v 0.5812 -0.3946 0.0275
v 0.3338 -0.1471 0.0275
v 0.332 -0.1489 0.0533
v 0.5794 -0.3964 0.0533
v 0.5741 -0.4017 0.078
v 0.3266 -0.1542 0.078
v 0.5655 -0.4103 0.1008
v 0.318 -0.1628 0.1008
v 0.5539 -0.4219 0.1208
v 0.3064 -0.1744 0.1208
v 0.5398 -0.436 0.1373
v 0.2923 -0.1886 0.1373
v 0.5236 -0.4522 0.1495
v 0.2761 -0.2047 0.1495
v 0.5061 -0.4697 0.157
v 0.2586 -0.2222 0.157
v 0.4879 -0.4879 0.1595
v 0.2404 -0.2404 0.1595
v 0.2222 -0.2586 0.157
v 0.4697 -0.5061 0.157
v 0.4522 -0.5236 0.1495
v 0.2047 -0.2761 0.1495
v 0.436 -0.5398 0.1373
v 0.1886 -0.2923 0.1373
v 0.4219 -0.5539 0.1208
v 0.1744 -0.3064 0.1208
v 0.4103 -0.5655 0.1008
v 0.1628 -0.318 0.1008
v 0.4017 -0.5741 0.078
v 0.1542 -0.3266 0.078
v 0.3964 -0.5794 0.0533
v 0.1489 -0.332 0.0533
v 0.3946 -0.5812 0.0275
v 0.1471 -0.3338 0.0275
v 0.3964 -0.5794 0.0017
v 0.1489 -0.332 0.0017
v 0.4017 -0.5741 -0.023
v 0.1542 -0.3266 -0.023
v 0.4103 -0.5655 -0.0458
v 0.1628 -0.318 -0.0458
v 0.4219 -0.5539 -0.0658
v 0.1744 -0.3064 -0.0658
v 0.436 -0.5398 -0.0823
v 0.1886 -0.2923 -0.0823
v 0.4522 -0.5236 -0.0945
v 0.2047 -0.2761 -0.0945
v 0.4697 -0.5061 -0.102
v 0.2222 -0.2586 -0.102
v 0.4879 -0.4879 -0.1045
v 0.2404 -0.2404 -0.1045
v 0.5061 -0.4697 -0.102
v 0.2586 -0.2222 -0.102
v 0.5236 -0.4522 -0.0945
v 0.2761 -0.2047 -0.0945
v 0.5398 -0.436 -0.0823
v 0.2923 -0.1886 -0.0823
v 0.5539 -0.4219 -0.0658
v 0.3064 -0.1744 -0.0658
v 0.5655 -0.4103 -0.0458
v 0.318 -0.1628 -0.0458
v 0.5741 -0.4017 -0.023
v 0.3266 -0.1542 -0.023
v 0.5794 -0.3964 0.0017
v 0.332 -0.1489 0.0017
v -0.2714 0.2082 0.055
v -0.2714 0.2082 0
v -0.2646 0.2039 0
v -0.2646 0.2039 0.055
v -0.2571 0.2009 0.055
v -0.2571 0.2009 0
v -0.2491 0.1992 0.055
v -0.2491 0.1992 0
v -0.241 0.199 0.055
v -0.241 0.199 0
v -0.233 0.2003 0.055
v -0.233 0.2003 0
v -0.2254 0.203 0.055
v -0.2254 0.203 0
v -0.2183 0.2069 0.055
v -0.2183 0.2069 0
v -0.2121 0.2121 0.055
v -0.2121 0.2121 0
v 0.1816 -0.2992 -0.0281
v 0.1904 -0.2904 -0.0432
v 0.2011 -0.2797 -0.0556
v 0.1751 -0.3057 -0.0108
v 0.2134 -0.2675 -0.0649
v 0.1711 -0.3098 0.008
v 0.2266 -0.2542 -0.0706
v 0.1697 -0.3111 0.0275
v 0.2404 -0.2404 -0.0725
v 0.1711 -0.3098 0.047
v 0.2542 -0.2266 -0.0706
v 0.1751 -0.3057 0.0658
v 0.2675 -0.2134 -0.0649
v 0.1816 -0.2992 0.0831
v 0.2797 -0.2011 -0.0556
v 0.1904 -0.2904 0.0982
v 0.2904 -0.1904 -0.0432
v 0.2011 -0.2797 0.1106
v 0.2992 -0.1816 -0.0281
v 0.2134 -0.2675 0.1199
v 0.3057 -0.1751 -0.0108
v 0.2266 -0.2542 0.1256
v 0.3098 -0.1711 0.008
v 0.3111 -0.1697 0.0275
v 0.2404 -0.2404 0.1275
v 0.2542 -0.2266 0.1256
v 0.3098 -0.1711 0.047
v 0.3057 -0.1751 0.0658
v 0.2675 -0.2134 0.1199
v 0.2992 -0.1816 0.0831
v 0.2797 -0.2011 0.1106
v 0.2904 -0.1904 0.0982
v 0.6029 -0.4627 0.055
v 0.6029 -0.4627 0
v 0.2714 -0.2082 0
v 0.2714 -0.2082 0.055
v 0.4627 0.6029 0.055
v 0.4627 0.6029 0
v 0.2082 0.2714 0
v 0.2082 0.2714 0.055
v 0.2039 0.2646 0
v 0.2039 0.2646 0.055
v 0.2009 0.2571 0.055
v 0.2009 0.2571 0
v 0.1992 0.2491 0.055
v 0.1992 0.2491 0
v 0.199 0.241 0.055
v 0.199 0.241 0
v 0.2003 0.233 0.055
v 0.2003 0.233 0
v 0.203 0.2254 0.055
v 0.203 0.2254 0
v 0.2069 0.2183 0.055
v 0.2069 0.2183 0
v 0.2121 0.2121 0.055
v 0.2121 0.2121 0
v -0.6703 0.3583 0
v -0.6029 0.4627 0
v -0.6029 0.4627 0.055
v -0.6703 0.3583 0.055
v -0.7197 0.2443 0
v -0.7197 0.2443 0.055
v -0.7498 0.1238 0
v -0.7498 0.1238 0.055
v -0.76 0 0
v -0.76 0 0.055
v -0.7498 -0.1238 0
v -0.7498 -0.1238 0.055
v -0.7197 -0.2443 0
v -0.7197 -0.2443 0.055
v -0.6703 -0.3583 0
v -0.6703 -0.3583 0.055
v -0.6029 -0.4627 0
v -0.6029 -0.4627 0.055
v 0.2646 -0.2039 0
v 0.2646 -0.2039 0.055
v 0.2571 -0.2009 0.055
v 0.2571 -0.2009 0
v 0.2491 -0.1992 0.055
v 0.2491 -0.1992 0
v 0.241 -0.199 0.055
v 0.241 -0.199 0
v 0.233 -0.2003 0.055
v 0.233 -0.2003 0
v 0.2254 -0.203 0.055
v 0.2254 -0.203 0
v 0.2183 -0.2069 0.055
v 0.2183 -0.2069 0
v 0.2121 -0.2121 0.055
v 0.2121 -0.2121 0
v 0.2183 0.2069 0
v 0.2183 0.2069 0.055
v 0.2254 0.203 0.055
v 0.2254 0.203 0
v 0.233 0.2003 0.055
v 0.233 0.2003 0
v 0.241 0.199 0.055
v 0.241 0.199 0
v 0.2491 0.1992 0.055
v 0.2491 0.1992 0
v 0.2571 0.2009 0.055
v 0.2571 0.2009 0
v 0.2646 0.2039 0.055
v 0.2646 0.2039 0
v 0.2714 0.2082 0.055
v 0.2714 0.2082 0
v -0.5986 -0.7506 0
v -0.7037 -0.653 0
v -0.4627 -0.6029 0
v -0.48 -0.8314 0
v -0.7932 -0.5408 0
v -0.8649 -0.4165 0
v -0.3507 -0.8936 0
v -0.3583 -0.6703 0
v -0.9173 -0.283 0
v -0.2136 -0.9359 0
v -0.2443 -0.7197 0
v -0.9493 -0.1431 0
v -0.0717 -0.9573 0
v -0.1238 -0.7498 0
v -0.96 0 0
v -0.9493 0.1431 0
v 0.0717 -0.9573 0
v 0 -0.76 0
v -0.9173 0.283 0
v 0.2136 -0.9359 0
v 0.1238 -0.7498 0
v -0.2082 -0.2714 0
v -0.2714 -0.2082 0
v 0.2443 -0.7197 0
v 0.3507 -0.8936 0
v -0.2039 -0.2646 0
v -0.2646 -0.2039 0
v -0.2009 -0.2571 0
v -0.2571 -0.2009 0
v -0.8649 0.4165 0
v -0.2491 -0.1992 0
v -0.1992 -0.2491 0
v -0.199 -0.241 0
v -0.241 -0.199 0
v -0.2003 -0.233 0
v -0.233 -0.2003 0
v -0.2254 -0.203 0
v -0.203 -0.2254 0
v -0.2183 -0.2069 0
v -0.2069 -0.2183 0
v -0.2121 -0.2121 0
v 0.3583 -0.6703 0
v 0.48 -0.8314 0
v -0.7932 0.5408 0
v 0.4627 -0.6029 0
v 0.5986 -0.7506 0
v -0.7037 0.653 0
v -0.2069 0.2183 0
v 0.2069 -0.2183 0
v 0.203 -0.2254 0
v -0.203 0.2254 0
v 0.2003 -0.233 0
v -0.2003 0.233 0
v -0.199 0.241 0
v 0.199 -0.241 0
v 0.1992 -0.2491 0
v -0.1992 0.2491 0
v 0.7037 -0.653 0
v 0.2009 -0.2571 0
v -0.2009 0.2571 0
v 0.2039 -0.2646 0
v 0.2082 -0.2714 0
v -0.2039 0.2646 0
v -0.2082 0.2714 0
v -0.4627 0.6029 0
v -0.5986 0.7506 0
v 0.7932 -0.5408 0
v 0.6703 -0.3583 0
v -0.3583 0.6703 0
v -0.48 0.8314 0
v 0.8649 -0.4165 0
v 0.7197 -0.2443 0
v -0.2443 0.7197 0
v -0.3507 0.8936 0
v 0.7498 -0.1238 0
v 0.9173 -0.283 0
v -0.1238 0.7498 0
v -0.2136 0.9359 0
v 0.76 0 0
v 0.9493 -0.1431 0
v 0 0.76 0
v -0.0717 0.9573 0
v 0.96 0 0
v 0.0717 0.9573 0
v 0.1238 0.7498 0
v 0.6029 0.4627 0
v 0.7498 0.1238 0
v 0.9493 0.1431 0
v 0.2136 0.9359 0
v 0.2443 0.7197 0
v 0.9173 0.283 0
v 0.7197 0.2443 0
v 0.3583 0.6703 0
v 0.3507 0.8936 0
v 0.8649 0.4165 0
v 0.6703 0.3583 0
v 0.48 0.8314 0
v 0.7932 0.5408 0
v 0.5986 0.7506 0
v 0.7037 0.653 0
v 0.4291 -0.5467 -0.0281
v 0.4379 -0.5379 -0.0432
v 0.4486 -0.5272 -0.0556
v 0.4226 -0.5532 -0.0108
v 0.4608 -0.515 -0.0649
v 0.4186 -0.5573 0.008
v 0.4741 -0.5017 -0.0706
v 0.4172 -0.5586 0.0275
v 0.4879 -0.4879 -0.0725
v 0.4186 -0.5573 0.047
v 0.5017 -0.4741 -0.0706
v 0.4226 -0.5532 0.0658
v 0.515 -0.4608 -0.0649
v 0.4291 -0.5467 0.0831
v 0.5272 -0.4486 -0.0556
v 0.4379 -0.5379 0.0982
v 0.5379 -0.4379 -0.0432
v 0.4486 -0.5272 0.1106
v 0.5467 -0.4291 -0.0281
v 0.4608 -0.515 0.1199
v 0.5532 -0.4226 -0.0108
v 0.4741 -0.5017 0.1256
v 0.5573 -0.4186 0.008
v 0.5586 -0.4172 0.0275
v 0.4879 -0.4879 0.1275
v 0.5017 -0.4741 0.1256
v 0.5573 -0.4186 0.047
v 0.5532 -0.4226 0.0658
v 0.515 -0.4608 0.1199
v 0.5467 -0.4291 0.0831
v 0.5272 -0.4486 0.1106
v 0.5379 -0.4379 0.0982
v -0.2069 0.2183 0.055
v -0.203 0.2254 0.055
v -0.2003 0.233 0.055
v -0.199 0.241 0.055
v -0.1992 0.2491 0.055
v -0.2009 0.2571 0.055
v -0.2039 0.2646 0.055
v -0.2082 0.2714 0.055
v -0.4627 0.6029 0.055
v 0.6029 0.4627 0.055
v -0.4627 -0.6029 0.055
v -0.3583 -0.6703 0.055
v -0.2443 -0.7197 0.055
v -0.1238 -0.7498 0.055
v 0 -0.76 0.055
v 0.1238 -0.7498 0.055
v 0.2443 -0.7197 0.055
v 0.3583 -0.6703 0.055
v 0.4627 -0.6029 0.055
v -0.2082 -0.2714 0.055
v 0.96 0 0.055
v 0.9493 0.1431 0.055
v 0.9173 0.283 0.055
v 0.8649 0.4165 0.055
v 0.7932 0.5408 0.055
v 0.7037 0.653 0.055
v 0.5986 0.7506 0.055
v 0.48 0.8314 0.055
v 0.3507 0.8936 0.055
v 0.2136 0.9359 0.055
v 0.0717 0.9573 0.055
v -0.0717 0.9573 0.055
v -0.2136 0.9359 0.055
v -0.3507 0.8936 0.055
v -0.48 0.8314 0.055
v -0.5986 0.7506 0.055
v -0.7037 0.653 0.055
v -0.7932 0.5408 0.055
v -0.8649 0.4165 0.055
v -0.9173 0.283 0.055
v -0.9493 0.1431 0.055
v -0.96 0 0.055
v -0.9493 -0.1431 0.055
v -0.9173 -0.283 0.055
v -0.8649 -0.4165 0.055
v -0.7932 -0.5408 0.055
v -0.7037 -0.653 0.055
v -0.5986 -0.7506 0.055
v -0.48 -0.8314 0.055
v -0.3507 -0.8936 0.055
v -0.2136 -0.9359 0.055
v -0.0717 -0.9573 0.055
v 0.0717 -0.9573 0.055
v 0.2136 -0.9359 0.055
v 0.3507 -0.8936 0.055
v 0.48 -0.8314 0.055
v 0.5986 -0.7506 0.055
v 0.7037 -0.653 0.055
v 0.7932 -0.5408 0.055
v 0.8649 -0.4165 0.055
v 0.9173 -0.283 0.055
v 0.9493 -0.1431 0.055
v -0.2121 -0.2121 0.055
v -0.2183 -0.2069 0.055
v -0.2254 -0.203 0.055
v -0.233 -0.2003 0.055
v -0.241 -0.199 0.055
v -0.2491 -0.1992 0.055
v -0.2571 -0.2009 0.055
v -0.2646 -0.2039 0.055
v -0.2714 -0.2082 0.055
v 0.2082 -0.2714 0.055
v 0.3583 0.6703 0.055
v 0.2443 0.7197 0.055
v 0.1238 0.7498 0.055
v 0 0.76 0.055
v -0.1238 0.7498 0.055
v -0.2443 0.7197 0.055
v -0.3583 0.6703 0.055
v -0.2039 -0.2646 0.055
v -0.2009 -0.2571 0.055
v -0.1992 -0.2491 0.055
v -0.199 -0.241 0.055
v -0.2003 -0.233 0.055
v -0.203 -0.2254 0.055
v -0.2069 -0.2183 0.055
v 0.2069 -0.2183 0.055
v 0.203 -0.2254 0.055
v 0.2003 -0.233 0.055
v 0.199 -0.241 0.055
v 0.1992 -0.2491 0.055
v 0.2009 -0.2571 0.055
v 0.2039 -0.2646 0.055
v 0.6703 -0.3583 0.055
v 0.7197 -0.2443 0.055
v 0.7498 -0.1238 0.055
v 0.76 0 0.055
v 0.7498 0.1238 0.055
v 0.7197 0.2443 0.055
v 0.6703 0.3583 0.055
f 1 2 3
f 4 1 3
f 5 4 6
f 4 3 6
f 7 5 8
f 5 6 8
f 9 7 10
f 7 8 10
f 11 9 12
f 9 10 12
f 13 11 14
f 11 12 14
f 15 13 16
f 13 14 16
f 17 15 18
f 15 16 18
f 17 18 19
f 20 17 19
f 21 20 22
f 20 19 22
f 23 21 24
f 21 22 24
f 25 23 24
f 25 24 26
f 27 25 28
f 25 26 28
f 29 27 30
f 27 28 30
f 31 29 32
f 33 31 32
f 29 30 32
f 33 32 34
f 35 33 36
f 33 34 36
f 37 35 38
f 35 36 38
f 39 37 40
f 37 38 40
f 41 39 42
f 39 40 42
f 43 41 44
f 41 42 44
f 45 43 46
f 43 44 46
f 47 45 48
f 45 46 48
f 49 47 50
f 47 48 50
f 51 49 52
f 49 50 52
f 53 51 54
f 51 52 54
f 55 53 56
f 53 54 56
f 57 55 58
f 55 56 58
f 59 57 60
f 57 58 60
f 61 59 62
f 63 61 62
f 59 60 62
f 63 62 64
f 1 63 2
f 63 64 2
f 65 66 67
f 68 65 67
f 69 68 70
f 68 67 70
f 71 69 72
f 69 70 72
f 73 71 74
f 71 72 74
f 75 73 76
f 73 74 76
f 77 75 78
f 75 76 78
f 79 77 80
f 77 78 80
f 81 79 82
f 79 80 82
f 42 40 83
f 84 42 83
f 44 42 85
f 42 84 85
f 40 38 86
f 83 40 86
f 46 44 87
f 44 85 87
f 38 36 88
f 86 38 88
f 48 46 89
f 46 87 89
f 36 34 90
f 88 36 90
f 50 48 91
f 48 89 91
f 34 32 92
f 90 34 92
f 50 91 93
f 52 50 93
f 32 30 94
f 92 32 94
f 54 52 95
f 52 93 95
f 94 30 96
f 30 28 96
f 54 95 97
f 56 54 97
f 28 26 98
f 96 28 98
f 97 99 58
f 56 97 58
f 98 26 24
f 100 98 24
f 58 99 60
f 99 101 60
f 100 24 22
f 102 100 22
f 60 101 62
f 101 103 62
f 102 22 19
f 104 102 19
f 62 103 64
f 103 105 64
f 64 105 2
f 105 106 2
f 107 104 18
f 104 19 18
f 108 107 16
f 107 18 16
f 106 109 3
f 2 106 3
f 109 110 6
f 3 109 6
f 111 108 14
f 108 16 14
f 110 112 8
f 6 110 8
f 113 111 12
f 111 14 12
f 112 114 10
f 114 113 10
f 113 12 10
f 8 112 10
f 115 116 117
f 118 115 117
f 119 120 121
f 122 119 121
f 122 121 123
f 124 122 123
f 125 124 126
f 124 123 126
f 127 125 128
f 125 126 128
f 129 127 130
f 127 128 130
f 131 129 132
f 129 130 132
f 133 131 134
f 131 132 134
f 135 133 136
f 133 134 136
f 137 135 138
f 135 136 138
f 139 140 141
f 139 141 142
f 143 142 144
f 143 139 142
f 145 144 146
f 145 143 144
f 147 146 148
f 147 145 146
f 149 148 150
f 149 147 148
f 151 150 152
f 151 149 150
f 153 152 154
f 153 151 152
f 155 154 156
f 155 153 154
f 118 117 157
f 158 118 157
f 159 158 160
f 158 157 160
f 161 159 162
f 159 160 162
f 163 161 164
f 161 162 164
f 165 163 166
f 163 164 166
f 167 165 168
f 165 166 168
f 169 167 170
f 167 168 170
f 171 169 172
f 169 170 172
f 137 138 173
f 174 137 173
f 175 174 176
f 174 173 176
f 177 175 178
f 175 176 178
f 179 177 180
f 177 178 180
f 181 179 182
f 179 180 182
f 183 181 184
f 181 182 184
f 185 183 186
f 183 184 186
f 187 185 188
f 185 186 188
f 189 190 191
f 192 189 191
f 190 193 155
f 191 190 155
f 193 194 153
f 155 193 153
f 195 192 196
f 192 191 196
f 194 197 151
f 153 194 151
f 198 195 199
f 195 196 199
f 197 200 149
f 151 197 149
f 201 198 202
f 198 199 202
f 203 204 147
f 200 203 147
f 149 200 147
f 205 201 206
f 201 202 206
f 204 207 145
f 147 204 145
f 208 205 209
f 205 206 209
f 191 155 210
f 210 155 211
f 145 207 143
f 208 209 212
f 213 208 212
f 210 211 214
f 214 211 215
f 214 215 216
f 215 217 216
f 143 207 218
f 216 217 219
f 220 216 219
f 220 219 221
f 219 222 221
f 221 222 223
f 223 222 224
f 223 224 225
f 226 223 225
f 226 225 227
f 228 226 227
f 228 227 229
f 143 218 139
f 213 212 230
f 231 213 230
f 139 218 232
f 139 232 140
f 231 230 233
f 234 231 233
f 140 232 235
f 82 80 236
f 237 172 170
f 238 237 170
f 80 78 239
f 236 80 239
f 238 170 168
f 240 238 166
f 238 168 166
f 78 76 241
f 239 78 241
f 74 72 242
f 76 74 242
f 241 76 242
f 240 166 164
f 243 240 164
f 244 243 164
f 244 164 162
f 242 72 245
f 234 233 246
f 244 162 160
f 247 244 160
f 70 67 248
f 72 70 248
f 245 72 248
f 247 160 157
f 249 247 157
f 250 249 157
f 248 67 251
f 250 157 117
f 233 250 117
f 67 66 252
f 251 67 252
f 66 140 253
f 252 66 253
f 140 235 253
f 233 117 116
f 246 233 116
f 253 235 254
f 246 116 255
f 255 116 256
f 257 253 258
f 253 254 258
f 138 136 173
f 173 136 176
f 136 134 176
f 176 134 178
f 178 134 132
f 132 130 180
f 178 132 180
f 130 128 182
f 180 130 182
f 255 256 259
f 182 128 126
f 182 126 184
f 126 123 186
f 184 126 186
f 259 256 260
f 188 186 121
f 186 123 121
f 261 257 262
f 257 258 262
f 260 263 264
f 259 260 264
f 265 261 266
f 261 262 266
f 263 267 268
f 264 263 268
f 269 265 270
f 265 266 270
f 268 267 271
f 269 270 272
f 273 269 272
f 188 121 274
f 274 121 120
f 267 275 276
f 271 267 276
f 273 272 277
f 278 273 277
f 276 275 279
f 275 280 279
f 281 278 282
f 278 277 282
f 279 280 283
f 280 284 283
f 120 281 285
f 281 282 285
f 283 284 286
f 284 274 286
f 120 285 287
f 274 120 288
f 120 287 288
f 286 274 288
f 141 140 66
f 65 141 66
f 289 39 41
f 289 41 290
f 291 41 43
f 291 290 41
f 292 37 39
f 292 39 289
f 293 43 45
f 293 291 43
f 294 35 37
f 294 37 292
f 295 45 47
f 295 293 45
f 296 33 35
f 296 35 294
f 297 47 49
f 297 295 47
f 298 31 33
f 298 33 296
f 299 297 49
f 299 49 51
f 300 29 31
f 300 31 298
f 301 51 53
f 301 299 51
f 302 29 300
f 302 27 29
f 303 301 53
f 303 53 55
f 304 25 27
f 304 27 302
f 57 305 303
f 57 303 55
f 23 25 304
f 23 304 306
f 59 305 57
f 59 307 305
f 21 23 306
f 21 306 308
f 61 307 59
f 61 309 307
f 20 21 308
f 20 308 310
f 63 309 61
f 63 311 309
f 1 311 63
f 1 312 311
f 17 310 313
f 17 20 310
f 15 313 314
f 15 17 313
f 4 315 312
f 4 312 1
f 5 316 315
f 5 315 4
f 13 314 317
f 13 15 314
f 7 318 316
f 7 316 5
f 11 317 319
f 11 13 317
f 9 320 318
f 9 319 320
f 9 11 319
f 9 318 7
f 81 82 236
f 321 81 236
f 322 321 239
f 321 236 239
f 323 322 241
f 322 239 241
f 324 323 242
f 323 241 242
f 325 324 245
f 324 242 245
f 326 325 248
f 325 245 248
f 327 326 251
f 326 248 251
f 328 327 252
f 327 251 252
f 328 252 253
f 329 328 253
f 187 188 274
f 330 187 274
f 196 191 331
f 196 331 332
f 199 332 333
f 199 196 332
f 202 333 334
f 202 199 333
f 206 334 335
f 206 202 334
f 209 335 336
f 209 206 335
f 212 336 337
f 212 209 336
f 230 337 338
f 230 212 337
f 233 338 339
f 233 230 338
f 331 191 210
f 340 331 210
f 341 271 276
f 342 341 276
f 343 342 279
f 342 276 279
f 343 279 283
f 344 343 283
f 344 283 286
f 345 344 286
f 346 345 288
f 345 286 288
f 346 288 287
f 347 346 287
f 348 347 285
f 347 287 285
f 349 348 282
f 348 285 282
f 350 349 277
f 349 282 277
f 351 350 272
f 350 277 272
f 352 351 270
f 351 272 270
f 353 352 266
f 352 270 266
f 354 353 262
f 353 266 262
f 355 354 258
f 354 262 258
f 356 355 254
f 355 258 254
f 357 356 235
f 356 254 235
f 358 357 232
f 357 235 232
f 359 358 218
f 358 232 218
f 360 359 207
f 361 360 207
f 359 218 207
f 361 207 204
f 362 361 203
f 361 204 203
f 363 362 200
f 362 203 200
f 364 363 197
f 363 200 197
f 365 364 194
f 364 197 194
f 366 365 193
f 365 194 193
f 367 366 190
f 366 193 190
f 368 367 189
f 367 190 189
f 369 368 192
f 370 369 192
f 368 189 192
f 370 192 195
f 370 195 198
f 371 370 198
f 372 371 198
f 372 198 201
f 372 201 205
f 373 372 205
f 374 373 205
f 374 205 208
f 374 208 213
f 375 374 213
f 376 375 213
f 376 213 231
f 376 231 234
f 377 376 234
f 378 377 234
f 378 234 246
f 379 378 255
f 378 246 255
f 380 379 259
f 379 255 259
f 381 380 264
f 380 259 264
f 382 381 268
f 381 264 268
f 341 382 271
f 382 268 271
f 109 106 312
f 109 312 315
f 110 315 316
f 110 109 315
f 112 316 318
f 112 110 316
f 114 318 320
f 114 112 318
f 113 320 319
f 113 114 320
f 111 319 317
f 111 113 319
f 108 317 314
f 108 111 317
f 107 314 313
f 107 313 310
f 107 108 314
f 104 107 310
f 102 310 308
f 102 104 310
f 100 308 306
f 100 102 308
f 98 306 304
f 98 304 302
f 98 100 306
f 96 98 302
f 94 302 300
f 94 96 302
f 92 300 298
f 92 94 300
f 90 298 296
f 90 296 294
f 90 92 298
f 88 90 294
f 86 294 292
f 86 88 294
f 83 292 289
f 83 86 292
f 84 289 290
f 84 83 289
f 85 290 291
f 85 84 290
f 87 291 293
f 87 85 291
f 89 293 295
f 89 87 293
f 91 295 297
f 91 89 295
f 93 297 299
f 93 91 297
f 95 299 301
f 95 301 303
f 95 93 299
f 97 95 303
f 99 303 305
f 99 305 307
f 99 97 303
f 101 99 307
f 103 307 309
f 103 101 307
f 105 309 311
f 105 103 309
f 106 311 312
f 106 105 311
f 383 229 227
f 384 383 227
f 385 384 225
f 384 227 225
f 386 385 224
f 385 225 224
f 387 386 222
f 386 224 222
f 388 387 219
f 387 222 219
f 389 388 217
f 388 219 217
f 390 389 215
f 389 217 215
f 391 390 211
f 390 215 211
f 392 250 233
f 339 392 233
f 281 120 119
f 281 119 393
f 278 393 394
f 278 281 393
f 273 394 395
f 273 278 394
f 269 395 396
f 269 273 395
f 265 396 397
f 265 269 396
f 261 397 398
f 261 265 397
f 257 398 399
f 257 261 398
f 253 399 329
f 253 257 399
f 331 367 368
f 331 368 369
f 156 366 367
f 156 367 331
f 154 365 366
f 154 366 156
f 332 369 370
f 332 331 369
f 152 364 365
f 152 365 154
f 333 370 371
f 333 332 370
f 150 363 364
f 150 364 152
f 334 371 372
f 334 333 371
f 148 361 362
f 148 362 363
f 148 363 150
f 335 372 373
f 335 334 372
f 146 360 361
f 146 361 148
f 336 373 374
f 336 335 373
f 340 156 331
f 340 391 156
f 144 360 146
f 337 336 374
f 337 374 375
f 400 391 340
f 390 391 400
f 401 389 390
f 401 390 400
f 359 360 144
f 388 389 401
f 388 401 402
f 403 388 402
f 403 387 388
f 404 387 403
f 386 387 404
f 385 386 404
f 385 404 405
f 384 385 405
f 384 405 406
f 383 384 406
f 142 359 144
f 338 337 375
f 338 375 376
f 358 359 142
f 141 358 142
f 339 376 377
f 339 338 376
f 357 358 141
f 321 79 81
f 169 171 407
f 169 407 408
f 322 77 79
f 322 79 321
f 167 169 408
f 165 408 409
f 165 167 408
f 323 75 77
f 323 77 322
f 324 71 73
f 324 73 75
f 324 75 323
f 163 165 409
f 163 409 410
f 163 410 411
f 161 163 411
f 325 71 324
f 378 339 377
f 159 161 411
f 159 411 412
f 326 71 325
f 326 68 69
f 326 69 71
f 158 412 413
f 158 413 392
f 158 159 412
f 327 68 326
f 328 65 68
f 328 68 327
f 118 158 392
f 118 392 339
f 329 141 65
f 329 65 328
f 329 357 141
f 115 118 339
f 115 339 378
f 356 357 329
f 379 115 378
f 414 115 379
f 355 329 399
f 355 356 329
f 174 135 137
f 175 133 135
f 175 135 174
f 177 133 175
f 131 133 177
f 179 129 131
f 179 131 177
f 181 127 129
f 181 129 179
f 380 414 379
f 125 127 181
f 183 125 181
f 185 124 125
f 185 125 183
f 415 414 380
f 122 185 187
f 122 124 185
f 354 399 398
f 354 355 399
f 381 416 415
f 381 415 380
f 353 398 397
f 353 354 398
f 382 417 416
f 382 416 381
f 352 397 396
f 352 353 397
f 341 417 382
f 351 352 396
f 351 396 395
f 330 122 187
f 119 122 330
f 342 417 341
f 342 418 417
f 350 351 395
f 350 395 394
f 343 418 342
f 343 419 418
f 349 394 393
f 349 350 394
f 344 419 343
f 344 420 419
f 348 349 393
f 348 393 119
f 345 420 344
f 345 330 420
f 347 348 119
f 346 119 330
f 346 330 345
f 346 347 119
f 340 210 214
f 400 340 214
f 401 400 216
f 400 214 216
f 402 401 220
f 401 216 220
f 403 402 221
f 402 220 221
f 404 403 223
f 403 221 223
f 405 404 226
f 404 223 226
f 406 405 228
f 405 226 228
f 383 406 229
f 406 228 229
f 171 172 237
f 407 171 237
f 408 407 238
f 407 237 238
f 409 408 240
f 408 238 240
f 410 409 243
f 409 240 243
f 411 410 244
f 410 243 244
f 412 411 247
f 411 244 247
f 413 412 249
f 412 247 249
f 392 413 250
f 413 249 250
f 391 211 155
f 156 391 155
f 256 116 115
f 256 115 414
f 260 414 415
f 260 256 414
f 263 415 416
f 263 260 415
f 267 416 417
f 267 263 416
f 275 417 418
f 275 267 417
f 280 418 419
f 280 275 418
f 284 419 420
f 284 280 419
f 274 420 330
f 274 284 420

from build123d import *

# Parameters (mm, degrees)
SKETCH_1_R      = 0.96
SKETCH_1_R_2    = 0.76
EXTRUDE_1_DEPTH = 0.055
EXTRUDE_START   = -0.055
EXTRUDE_2_DEPTH = 0.055
SKETCH_66_R     = 0.132
SKETCH_66_R_2   = 0.1
EXTRUDE_3_DEPTH = 0.35


with BuildPart() as part:
    # 草圖1 → 填料-伸長1 (new body)
    with BuildSketch(Plane.XY):
        Circle(SKETCH_1_R)
        Circle(SKETCH_1_R_2, mode=Mode.SUBTRACT)
    extrude(amount=EXTRUDE_1_DEPTH)

    # 草圖2 → 填料-伸長2 (add)
    with BuildSketch(Plane.XY.offset(0.055).offset(EXTRUDE_START)):
        with BuildLine():
            Line((-0.208247811, 0.271393831), (-0.462658686, 0.602948539))
            ThreePointArc((-0.462658686, 0.602948539), (-0.537401154, 0.537401154), (-0.602948539, 0.462658686))
            Line((-0.602948539, 0.462658686), (-0.271393831, 0.208247811))
            ThreePointArc((-0.271393831, 0.208247811), (-0.241031974, 0.199037642), (-0.212132034, 0.212132034))
            ThreePointArc((-0.212132034, 0.212132034), (-0.199037642, 0.241031974), (-0.208247811, 0.271393831))
        make_face()
        with BuildLine():
            ThreePointArc((0.208247811, 0.271393831), (0.199037642, 0.241031974), (0.212132034, 0.212132034))
            ThreePointArc((0.212132034, 0.212132034), (0.241031974, 0.199037642), (0.271393831, 0.208247811))
            Line((0.271393831, 0.208247811), (0.602948539, 0.462658686))
            ThreePointArc((0.602948539, 0.462658686), (0.537401154, 0.537401154), (0.462658686, 0.602948539))
            Line((0.462658686, 0.602948539), (0.208247811, 0.271393831))
        make_face()
        with BuildLine():
            ThreePointArc((0.271393831, -0.208247811), (0.241031974, -0.199037642), (0.212132034, -0.212132034))
            ThreePointArc((0.212132034, -0.212132034), (0.199037642, -0.241031974), (0.208247811, -0.271393831))
            Line((0.208247811, -0.271393831), (0.462658686, -0.602948539))
            ThreePointArc((0.462658686, -0.602948539), (0.537401154, -0.537401154), (0.602948539, -0.462658686))
            Line((0.602948539, -0.462658686), (0.271393831, -0.208247811))
        make_face()
        with BuildLine():
            ThreePointArc((-0.208247811, -0.271393831), (-0.199037642, -0.241031974), (-0.212132034, -0.212132034))
            ThreePointArc((-0.212132034, -0.212132034), (-0.241031974, -0.199037642), (-0.271393831, -0.208247811))
            Line((-0.271393831, -0.208247811), (-0.602948539, -0.462658686))
            ThreePointArc((-0.602948539, -0.462658686), (-0.537401154, -0.537401154), (-0.462658686, -0.602948539))
            Line((-0.462658686, -0.602948539), (-0.208247811, -0.271393831))
        make_face()
    extrude(amount=EXTRUDE_2_DEPTH)


with BuildPart() as body_2:
    # 草圖66 → 填料-伸長3 (new body)
    with BuildSketch(Plane(origin=(0.240416306, -0.240416306, 0), x_dir=(0.7071067811865477, 0.7071067811865475, 0), z_dir=(0.7071067811865475, -0.7071067811865477, 0))):
        with Locations((0, 0.0275)):
            Circle(SKETCH_66_R)
        with Locations((0, 0.0275)):
            Circle(SKETCH_66_R_2, mode=Mode.SUBTRACT)
    extrude(amount=EXTRUDE_3_DEPTH)


solid = Compound([part.part, body_2.part])
